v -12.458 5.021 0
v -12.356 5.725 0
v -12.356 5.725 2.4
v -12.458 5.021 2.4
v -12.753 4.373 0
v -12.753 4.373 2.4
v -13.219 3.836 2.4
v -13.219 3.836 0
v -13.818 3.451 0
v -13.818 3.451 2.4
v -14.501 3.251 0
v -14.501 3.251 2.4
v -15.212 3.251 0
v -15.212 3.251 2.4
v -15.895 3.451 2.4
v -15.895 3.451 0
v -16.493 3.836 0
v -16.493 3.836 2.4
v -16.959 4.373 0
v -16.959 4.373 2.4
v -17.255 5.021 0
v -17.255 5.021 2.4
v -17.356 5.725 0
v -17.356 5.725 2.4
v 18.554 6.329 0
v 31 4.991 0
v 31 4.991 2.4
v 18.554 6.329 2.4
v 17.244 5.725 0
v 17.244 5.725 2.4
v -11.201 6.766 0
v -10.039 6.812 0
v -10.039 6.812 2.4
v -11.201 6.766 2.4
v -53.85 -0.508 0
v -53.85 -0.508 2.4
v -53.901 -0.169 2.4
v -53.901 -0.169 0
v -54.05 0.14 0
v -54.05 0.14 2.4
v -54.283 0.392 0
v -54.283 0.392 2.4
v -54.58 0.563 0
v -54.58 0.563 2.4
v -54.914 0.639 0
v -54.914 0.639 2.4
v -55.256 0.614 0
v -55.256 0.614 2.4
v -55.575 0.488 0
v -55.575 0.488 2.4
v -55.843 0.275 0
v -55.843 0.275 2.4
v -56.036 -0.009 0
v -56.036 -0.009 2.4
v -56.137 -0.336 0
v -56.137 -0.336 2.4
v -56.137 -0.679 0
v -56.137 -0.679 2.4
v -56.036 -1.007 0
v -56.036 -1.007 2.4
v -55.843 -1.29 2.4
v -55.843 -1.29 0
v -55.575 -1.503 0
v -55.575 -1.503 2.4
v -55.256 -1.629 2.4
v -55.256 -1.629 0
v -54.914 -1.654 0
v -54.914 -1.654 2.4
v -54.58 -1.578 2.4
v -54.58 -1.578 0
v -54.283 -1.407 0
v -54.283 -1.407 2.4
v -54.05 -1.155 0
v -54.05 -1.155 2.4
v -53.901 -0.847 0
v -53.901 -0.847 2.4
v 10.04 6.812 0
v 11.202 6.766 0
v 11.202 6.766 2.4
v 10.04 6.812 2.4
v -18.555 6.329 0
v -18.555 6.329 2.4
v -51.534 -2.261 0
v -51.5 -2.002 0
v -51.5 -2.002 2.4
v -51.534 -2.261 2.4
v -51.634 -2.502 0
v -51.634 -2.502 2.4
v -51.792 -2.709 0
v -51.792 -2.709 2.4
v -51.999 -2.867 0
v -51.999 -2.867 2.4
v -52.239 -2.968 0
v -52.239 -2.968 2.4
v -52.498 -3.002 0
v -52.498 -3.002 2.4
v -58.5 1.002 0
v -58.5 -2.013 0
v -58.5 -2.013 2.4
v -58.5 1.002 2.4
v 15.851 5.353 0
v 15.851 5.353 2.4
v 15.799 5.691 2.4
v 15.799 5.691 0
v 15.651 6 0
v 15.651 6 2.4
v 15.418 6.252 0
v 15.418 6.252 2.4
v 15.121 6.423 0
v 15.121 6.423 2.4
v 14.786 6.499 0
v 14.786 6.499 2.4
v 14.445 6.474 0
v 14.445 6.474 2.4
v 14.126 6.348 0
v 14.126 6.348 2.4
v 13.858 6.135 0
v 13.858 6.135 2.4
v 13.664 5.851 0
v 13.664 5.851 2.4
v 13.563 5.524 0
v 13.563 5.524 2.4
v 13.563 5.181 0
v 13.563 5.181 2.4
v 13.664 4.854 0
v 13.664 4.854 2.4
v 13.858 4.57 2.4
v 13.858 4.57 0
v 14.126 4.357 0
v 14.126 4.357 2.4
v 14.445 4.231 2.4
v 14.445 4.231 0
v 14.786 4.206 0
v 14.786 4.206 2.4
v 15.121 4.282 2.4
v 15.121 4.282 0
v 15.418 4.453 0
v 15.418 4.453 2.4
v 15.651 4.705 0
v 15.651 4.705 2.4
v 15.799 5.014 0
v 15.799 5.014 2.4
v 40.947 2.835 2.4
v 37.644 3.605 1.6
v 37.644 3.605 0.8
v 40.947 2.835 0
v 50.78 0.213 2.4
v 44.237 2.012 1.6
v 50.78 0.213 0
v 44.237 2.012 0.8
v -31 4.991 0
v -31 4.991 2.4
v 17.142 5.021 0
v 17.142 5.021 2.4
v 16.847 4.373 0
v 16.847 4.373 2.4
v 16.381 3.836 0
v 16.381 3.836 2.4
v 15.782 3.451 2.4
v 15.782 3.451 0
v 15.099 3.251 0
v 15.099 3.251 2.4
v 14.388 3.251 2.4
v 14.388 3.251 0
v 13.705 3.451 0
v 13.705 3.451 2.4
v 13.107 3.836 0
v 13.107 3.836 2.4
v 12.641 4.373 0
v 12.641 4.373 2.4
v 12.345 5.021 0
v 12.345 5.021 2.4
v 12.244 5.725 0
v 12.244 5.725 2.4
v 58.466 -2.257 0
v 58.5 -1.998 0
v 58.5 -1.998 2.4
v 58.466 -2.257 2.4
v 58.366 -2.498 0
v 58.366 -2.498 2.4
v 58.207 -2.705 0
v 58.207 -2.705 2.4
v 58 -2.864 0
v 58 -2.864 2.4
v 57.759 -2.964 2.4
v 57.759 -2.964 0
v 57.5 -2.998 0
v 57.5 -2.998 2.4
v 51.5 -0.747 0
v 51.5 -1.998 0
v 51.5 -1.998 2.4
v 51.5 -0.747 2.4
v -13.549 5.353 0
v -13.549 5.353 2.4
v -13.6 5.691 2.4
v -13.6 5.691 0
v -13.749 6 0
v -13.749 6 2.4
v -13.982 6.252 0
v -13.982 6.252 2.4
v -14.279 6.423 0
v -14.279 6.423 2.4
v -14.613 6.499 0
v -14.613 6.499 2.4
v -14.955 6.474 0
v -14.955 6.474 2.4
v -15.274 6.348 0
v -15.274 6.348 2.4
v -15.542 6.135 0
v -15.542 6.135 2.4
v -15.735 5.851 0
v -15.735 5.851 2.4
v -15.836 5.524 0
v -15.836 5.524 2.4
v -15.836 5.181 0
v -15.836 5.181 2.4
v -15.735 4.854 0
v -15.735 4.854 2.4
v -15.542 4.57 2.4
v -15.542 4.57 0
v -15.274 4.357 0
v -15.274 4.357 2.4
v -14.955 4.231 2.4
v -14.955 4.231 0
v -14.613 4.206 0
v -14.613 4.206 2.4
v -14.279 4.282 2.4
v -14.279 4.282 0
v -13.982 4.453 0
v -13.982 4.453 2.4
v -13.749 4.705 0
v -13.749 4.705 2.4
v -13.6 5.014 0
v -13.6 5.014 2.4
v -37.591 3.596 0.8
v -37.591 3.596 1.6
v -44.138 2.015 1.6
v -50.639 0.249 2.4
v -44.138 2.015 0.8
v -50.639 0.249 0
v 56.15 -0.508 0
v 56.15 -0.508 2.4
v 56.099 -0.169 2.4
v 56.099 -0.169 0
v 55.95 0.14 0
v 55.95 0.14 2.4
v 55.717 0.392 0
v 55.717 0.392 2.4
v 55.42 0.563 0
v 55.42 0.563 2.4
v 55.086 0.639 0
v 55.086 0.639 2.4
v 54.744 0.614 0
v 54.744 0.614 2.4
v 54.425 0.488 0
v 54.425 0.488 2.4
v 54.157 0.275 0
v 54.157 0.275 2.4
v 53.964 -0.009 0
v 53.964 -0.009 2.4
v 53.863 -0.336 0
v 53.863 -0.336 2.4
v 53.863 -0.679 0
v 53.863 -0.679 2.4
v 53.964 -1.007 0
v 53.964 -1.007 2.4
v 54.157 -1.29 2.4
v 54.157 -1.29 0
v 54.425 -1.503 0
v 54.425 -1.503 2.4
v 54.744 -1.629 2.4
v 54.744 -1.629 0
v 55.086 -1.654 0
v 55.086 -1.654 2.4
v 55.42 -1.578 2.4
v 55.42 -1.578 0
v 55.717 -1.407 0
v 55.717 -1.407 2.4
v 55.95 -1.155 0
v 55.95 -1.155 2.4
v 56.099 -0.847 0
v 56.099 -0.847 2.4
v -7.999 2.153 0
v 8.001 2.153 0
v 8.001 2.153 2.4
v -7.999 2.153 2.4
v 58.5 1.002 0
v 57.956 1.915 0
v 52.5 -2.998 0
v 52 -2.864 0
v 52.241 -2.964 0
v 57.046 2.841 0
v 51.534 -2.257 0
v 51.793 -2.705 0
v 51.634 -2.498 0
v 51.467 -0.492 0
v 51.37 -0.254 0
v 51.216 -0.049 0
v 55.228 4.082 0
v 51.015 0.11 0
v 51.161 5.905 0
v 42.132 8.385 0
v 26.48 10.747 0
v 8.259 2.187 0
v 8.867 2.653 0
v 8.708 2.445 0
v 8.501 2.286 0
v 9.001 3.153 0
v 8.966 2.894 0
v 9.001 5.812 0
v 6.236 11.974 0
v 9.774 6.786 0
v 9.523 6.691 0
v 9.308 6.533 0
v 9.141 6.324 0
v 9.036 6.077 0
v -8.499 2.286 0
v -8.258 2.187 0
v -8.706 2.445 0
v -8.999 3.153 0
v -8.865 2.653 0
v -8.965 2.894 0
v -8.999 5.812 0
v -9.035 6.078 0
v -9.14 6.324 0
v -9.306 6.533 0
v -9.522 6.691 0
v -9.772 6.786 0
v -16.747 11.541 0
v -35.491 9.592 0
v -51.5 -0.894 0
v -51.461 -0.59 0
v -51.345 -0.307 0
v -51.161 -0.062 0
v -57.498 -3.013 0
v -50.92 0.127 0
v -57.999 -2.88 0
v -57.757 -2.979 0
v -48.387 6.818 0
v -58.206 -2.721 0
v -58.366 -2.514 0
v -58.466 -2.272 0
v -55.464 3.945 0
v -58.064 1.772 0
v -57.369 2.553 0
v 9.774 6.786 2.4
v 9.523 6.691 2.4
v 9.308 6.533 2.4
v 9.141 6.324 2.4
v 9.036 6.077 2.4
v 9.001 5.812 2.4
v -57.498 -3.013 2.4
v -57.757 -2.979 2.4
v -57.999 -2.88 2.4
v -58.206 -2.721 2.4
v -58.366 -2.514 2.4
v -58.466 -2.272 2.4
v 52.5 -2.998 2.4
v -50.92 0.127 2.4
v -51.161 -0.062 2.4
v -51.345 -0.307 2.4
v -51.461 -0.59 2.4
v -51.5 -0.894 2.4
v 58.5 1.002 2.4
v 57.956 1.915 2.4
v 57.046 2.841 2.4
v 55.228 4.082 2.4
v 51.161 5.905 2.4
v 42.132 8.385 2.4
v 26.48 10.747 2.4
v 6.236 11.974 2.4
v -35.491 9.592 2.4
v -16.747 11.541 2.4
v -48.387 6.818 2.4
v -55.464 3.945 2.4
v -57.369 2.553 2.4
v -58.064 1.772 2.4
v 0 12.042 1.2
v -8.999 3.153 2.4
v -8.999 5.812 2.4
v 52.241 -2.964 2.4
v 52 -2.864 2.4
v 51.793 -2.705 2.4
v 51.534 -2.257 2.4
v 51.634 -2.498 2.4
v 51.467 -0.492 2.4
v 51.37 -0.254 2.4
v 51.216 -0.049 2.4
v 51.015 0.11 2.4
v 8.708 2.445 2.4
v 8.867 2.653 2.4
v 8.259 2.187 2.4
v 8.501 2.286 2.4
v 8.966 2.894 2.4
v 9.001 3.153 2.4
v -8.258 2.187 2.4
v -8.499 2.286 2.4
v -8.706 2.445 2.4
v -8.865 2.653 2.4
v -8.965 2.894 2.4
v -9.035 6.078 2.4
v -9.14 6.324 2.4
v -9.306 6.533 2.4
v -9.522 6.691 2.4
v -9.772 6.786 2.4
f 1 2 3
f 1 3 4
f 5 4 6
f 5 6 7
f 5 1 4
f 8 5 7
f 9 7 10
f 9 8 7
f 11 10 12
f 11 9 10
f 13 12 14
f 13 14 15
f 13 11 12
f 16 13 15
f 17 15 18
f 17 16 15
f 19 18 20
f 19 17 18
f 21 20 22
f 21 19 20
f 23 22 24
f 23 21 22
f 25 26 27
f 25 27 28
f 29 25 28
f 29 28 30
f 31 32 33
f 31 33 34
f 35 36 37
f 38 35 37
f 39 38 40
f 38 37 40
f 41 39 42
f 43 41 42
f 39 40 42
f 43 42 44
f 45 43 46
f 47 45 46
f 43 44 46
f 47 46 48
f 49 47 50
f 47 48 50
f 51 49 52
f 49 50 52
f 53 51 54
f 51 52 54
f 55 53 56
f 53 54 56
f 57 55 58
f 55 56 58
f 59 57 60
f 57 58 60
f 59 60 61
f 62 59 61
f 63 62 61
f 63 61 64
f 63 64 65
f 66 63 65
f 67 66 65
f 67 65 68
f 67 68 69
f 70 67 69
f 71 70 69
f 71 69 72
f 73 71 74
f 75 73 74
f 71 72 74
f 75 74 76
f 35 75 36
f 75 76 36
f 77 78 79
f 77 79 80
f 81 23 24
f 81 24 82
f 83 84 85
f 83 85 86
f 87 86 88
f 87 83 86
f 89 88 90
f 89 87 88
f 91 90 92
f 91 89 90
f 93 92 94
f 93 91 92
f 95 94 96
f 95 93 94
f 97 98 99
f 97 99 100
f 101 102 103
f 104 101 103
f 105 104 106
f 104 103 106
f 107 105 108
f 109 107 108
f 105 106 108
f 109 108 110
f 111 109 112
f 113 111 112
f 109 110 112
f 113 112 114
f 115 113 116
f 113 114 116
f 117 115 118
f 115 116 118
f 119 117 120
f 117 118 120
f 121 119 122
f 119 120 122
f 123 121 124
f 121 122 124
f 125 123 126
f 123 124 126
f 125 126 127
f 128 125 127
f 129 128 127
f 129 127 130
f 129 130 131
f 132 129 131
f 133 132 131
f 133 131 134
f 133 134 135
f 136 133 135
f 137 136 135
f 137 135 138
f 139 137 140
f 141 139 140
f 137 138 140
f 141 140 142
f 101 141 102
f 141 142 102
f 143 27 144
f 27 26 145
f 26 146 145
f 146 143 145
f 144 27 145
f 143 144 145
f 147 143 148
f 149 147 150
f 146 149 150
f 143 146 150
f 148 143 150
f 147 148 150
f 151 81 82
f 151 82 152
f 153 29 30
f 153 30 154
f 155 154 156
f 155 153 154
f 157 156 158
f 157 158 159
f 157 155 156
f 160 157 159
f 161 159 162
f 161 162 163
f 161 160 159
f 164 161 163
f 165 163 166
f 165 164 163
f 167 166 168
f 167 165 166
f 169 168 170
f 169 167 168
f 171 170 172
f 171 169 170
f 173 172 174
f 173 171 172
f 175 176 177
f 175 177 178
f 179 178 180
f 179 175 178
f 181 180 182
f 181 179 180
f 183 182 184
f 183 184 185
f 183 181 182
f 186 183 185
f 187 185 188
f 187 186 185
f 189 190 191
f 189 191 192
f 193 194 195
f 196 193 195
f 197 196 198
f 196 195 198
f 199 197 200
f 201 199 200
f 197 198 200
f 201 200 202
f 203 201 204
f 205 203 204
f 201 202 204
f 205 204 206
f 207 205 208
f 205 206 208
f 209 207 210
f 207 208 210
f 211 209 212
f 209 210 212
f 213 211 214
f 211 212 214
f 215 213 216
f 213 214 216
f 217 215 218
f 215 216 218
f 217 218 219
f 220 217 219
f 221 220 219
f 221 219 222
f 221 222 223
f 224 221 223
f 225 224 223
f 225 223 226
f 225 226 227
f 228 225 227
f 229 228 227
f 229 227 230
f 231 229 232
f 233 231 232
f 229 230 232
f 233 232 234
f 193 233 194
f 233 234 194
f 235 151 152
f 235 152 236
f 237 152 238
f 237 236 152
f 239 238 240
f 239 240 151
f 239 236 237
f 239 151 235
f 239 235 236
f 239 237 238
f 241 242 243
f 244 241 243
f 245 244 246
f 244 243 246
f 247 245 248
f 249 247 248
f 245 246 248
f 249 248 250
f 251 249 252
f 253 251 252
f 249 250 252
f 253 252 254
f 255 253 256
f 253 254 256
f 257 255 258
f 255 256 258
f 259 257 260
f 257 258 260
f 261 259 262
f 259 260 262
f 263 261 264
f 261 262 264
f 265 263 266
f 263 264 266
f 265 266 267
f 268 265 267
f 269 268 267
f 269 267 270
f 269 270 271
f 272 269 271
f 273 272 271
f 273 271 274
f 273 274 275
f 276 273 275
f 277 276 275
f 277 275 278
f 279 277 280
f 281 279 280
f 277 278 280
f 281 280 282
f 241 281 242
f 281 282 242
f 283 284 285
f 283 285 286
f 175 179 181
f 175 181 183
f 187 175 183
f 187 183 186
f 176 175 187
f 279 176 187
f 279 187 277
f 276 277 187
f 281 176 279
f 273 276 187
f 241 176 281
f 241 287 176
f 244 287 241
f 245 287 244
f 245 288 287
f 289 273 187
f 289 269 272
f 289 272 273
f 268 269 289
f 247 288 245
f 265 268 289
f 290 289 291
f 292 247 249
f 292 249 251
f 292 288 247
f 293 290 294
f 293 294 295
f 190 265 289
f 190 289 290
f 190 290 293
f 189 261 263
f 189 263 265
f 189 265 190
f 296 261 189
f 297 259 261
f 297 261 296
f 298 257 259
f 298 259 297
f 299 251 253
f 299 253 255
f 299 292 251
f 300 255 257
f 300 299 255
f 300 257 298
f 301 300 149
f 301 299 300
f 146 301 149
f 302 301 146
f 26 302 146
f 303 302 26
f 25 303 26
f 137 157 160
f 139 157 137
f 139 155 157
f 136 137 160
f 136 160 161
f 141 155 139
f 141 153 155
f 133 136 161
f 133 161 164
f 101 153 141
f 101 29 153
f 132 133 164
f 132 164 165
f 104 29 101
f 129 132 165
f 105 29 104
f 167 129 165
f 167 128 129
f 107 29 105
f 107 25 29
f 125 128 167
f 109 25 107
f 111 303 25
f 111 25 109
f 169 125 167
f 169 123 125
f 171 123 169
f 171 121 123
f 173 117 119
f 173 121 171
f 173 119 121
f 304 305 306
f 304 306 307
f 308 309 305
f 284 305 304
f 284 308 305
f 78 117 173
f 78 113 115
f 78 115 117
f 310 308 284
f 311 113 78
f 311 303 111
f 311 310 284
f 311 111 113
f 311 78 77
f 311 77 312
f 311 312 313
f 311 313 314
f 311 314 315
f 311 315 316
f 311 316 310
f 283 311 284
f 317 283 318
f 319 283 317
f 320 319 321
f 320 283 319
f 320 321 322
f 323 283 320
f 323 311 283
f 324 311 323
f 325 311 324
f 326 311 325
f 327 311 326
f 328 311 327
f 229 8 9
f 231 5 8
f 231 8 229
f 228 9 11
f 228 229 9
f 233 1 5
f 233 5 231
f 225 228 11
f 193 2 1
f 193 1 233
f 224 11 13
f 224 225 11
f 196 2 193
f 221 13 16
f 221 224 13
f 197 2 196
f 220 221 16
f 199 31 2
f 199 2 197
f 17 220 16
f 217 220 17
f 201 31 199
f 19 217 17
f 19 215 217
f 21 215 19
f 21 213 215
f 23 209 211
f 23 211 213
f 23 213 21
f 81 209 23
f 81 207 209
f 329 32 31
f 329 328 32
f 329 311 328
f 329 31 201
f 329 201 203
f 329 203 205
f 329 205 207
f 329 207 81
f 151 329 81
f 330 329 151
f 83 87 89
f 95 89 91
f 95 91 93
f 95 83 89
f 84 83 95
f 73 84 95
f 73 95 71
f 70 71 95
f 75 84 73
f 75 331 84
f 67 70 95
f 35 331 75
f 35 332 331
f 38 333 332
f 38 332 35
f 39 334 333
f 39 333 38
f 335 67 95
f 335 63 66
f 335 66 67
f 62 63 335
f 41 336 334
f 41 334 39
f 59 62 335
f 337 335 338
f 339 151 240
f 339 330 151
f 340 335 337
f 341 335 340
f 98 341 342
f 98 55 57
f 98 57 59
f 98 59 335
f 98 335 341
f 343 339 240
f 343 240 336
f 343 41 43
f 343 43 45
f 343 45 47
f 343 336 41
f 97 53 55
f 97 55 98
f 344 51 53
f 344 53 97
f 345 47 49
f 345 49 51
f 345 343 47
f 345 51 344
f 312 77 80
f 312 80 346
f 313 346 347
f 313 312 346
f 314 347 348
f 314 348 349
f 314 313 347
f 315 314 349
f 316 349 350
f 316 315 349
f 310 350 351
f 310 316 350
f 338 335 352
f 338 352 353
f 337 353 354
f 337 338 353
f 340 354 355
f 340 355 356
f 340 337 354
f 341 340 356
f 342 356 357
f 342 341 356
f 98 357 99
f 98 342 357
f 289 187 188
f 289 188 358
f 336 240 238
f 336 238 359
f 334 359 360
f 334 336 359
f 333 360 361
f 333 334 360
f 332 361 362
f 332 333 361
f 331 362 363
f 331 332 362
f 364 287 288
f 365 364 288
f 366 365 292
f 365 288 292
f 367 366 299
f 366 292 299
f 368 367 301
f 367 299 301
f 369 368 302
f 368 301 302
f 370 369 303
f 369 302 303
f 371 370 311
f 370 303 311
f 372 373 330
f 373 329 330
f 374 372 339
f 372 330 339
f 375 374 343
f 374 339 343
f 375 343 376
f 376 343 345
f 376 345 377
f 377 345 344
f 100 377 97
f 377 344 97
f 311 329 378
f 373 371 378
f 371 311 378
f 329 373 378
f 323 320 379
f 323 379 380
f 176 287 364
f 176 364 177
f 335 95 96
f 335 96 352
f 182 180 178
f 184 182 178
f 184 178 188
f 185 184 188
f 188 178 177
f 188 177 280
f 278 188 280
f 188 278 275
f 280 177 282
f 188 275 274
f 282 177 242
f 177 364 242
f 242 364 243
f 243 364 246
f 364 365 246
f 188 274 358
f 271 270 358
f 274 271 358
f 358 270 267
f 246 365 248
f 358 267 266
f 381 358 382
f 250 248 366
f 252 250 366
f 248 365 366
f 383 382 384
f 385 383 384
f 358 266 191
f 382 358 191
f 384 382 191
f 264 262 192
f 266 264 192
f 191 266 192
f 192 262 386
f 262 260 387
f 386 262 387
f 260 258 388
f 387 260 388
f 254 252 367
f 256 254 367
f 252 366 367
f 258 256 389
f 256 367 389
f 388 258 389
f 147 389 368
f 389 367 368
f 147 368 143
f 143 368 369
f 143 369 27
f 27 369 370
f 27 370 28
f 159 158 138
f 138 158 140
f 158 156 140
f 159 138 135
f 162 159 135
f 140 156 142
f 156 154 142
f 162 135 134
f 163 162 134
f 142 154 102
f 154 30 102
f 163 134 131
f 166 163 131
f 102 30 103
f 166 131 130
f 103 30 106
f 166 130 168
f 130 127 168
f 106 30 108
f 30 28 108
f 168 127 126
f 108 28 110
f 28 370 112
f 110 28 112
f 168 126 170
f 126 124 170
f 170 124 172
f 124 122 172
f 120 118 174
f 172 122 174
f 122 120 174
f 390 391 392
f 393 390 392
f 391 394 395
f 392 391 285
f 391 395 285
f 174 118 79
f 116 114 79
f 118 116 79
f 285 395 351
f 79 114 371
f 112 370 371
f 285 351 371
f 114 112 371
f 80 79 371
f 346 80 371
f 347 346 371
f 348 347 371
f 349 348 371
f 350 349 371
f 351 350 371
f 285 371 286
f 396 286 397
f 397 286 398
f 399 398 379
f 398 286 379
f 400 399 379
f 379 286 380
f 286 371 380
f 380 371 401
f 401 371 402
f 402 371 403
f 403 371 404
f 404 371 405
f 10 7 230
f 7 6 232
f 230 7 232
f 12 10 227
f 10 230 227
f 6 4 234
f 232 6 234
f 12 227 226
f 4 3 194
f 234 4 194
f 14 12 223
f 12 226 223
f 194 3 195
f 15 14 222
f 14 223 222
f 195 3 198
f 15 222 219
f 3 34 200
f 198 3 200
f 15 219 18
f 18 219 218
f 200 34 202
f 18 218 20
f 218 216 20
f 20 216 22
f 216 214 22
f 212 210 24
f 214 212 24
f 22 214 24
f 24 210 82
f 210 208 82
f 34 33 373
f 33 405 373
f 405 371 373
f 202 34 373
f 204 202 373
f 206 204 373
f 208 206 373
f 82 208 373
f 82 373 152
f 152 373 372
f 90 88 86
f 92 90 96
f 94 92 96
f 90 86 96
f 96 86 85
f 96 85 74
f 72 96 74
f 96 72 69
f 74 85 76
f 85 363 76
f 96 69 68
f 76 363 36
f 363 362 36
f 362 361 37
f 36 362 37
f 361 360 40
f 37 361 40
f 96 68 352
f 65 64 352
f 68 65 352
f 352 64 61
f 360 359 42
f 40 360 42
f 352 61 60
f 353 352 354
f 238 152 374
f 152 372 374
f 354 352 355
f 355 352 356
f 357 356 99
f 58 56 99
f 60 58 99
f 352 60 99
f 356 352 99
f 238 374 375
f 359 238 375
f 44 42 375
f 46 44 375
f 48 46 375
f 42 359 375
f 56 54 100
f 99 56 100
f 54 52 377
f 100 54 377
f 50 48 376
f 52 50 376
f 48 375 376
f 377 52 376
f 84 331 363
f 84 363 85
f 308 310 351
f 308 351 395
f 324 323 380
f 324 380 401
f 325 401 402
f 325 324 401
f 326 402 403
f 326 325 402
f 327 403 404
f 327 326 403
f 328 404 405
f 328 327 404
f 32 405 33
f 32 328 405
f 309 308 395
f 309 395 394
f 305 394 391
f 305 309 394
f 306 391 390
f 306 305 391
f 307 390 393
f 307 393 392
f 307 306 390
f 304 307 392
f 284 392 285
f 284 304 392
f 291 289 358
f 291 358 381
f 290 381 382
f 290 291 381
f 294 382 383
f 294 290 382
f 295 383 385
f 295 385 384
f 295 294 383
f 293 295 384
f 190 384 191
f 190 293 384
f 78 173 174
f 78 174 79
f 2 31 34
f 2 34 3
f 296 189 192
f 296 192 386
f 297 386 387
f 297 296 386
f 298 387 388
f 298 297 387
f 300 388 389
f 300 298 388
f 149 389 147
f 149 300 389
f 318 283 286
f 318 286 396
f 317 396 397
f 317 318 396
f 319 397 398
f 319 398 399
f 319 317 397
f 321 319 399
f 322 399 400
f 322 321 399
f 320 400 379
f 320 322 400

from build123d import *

# Parameters (mm, degrees)
BOSS_EXTRUDE2_DEPTH = 2.4
SKETCH1_R           = 1.15
CUT_EXTRUDE1_DEPTH  = 2.4


with BuildPart() as part:
    # Szkic1 → Boss-Extrude2 (new body)
    with BuildSketch(Plane.XY):
        with BuildLine():
            Line((-10.038681529, 6.811589572), (-11.201099301, 6.765821135))
            Line((-11.201099301, 6.765821135), (-12.356296421, 5.725087863))
            ThreePointArc((-12.356296421, 5.725087863), (-14.856296421, 3.225087863), (-17.356296421, 5.725087863))
            Line((-17.356296421, 5.725087863), (-18.554529735, 6.329270322))
            Line((-18.554529735, 6.329270322), (-31, 4.99130079))
            add(Edge.make_bspline(
                [(-31, 4.99130079), (-37.613672397, 3.688579862), (-44.160698718, 2.10757006), (-50.639420354, 0.248675937)],
                knots=[0, 0, 0, 0, 0.957580525, 0.957580525, 0.957580525, 0.957580525], degree=3))
            ThreePointArc((-50.639420354, 0.248675937), (-51.260787122, -0.178490214), (-51.500016351, -0.893568501))
            Line((-51.500016351, -0.893568501), (-51.500016351, -2.002159088))
            ThreePointArc((-51.500016351, -2.002159088), (-51.792145807, -2.708501281), (-52.497854937, -3.002156752))
            Line((-52.497854937, -3.002156752), (-57.497838586, -3.012963812))
            ThreePointArc((-57.497838586, -3.012963812), (-58.206342193, -2.720836692), (-58.5, -2.012966148))
            Line((-58.5, -2.012966148), (-58.5, 1.001731028))
            add(Edge.make_bspline(
                [(58.5, 1.001731028), (54.007233316, 12.041738456), (0, 12.041738456), (-54.007233316, 12.041738456), (-58.5, 1.001731028)],
                knots=[3.224877141, 3.224877141, 3.224877141, 4.71238898, 4.71238898, 6.199900819, 6.199900819, 6.199900819], degree=2, weights=[1, 0.735930785, 1, 0.735930785, 1]))
            Line((58.5, 1.001731028), (58.5, -1.998268938))
            ThreePointArc((58.5, -1.998268938), (58.207106781, -2.705375719), (57.5, -2.998268938))
            Line((57.5, -2.998268938), (52.5, -2.998268938))
            ThreePointArc((52.5, -2.998268938), (51.792893219, -2.705375719), (51.5, -1.998268938))
            Line((51.5, -1.998268938), (51.5, -0.746759199))
            ThreePointArc((51.5, -0.746759199), (51.30006128, -0.146840914), (50.780196103, 0.213183583))
            add(Edge.make_bspline(
                [(31, 4.99130079), (37.668939941, 3.708375899), (44.262338642, 2.115670164), (50.780196103, 0.213183583)],
                knots=[0, 0, 0, 0, 0.964480492, 0.964480492, 0.964480492, 0.964480492], degree=3))
            Line((31, 4.99130079), (18.55432572, 6.329285731))
            Line((18.55432572, 6.329285731), (17.243703579, 5.725087863))
            ThreePointArc((17.243703579, 5.725087863), (14.743703579, 3.225087863), (12.243703579, 5.725087863))
            Line((12.243703579, 5.725087863), (11.202144167, 6.765775333))
            Line((11.202144167, 6.765775333), (10.039906762, 6.81154198))
            ThreePointArc((10.039906762, 6.81154198), (9.307503491, 6.533200421), (9.000559204, 5.812316395))
            Line((9.000559204, 5.812316395), (9.000559204, 3.152512128))
            ThreePointArc((9.000559204, 3.152512128), (8.707665985, 2.445405346), (8.000559204, 2.152512128))
            Line((8.000559204, 2.152512128), (-7.999338529, 2.152512128))
            ThreePointArc((-7.999338529, 2.152512128), (-8.70644531, 2.445405346), (-8.999338529, 3.152512128))
            Line((-8.999338529, 3.152512128), (-8.999338529, 5.812363808))
            ThreePointArc((-8.999338529, 5.812363808), (-9.306281172, 6.533246253), (-10.038681529, 6.811589572))
        make_face()
    extrude(amount=BOSS_EXTRUDE2_DEPTH)

    # Sketch1 → Cut-Extrude1 (cut)
    with BuildSketch(Plane.XY.offset(2.4)):
        with Locations((-55, -0.507559097)):
            Circle(SKETCH1_R)
        with Locations((-14.699338529, 5.352512128)):
            Circle(SKETCH1_R)
        with Locations((14.700559204, 5.352512128)):
            Circle(SKETCH1_R)
        with Locations((55, -0.507559097)):
            Circle(SKETCH1_R)
    extrude(amount=-CUT_EXTRUDE1_DEPTH, mode=Mode.SUBTRACT)


solid = part.part
